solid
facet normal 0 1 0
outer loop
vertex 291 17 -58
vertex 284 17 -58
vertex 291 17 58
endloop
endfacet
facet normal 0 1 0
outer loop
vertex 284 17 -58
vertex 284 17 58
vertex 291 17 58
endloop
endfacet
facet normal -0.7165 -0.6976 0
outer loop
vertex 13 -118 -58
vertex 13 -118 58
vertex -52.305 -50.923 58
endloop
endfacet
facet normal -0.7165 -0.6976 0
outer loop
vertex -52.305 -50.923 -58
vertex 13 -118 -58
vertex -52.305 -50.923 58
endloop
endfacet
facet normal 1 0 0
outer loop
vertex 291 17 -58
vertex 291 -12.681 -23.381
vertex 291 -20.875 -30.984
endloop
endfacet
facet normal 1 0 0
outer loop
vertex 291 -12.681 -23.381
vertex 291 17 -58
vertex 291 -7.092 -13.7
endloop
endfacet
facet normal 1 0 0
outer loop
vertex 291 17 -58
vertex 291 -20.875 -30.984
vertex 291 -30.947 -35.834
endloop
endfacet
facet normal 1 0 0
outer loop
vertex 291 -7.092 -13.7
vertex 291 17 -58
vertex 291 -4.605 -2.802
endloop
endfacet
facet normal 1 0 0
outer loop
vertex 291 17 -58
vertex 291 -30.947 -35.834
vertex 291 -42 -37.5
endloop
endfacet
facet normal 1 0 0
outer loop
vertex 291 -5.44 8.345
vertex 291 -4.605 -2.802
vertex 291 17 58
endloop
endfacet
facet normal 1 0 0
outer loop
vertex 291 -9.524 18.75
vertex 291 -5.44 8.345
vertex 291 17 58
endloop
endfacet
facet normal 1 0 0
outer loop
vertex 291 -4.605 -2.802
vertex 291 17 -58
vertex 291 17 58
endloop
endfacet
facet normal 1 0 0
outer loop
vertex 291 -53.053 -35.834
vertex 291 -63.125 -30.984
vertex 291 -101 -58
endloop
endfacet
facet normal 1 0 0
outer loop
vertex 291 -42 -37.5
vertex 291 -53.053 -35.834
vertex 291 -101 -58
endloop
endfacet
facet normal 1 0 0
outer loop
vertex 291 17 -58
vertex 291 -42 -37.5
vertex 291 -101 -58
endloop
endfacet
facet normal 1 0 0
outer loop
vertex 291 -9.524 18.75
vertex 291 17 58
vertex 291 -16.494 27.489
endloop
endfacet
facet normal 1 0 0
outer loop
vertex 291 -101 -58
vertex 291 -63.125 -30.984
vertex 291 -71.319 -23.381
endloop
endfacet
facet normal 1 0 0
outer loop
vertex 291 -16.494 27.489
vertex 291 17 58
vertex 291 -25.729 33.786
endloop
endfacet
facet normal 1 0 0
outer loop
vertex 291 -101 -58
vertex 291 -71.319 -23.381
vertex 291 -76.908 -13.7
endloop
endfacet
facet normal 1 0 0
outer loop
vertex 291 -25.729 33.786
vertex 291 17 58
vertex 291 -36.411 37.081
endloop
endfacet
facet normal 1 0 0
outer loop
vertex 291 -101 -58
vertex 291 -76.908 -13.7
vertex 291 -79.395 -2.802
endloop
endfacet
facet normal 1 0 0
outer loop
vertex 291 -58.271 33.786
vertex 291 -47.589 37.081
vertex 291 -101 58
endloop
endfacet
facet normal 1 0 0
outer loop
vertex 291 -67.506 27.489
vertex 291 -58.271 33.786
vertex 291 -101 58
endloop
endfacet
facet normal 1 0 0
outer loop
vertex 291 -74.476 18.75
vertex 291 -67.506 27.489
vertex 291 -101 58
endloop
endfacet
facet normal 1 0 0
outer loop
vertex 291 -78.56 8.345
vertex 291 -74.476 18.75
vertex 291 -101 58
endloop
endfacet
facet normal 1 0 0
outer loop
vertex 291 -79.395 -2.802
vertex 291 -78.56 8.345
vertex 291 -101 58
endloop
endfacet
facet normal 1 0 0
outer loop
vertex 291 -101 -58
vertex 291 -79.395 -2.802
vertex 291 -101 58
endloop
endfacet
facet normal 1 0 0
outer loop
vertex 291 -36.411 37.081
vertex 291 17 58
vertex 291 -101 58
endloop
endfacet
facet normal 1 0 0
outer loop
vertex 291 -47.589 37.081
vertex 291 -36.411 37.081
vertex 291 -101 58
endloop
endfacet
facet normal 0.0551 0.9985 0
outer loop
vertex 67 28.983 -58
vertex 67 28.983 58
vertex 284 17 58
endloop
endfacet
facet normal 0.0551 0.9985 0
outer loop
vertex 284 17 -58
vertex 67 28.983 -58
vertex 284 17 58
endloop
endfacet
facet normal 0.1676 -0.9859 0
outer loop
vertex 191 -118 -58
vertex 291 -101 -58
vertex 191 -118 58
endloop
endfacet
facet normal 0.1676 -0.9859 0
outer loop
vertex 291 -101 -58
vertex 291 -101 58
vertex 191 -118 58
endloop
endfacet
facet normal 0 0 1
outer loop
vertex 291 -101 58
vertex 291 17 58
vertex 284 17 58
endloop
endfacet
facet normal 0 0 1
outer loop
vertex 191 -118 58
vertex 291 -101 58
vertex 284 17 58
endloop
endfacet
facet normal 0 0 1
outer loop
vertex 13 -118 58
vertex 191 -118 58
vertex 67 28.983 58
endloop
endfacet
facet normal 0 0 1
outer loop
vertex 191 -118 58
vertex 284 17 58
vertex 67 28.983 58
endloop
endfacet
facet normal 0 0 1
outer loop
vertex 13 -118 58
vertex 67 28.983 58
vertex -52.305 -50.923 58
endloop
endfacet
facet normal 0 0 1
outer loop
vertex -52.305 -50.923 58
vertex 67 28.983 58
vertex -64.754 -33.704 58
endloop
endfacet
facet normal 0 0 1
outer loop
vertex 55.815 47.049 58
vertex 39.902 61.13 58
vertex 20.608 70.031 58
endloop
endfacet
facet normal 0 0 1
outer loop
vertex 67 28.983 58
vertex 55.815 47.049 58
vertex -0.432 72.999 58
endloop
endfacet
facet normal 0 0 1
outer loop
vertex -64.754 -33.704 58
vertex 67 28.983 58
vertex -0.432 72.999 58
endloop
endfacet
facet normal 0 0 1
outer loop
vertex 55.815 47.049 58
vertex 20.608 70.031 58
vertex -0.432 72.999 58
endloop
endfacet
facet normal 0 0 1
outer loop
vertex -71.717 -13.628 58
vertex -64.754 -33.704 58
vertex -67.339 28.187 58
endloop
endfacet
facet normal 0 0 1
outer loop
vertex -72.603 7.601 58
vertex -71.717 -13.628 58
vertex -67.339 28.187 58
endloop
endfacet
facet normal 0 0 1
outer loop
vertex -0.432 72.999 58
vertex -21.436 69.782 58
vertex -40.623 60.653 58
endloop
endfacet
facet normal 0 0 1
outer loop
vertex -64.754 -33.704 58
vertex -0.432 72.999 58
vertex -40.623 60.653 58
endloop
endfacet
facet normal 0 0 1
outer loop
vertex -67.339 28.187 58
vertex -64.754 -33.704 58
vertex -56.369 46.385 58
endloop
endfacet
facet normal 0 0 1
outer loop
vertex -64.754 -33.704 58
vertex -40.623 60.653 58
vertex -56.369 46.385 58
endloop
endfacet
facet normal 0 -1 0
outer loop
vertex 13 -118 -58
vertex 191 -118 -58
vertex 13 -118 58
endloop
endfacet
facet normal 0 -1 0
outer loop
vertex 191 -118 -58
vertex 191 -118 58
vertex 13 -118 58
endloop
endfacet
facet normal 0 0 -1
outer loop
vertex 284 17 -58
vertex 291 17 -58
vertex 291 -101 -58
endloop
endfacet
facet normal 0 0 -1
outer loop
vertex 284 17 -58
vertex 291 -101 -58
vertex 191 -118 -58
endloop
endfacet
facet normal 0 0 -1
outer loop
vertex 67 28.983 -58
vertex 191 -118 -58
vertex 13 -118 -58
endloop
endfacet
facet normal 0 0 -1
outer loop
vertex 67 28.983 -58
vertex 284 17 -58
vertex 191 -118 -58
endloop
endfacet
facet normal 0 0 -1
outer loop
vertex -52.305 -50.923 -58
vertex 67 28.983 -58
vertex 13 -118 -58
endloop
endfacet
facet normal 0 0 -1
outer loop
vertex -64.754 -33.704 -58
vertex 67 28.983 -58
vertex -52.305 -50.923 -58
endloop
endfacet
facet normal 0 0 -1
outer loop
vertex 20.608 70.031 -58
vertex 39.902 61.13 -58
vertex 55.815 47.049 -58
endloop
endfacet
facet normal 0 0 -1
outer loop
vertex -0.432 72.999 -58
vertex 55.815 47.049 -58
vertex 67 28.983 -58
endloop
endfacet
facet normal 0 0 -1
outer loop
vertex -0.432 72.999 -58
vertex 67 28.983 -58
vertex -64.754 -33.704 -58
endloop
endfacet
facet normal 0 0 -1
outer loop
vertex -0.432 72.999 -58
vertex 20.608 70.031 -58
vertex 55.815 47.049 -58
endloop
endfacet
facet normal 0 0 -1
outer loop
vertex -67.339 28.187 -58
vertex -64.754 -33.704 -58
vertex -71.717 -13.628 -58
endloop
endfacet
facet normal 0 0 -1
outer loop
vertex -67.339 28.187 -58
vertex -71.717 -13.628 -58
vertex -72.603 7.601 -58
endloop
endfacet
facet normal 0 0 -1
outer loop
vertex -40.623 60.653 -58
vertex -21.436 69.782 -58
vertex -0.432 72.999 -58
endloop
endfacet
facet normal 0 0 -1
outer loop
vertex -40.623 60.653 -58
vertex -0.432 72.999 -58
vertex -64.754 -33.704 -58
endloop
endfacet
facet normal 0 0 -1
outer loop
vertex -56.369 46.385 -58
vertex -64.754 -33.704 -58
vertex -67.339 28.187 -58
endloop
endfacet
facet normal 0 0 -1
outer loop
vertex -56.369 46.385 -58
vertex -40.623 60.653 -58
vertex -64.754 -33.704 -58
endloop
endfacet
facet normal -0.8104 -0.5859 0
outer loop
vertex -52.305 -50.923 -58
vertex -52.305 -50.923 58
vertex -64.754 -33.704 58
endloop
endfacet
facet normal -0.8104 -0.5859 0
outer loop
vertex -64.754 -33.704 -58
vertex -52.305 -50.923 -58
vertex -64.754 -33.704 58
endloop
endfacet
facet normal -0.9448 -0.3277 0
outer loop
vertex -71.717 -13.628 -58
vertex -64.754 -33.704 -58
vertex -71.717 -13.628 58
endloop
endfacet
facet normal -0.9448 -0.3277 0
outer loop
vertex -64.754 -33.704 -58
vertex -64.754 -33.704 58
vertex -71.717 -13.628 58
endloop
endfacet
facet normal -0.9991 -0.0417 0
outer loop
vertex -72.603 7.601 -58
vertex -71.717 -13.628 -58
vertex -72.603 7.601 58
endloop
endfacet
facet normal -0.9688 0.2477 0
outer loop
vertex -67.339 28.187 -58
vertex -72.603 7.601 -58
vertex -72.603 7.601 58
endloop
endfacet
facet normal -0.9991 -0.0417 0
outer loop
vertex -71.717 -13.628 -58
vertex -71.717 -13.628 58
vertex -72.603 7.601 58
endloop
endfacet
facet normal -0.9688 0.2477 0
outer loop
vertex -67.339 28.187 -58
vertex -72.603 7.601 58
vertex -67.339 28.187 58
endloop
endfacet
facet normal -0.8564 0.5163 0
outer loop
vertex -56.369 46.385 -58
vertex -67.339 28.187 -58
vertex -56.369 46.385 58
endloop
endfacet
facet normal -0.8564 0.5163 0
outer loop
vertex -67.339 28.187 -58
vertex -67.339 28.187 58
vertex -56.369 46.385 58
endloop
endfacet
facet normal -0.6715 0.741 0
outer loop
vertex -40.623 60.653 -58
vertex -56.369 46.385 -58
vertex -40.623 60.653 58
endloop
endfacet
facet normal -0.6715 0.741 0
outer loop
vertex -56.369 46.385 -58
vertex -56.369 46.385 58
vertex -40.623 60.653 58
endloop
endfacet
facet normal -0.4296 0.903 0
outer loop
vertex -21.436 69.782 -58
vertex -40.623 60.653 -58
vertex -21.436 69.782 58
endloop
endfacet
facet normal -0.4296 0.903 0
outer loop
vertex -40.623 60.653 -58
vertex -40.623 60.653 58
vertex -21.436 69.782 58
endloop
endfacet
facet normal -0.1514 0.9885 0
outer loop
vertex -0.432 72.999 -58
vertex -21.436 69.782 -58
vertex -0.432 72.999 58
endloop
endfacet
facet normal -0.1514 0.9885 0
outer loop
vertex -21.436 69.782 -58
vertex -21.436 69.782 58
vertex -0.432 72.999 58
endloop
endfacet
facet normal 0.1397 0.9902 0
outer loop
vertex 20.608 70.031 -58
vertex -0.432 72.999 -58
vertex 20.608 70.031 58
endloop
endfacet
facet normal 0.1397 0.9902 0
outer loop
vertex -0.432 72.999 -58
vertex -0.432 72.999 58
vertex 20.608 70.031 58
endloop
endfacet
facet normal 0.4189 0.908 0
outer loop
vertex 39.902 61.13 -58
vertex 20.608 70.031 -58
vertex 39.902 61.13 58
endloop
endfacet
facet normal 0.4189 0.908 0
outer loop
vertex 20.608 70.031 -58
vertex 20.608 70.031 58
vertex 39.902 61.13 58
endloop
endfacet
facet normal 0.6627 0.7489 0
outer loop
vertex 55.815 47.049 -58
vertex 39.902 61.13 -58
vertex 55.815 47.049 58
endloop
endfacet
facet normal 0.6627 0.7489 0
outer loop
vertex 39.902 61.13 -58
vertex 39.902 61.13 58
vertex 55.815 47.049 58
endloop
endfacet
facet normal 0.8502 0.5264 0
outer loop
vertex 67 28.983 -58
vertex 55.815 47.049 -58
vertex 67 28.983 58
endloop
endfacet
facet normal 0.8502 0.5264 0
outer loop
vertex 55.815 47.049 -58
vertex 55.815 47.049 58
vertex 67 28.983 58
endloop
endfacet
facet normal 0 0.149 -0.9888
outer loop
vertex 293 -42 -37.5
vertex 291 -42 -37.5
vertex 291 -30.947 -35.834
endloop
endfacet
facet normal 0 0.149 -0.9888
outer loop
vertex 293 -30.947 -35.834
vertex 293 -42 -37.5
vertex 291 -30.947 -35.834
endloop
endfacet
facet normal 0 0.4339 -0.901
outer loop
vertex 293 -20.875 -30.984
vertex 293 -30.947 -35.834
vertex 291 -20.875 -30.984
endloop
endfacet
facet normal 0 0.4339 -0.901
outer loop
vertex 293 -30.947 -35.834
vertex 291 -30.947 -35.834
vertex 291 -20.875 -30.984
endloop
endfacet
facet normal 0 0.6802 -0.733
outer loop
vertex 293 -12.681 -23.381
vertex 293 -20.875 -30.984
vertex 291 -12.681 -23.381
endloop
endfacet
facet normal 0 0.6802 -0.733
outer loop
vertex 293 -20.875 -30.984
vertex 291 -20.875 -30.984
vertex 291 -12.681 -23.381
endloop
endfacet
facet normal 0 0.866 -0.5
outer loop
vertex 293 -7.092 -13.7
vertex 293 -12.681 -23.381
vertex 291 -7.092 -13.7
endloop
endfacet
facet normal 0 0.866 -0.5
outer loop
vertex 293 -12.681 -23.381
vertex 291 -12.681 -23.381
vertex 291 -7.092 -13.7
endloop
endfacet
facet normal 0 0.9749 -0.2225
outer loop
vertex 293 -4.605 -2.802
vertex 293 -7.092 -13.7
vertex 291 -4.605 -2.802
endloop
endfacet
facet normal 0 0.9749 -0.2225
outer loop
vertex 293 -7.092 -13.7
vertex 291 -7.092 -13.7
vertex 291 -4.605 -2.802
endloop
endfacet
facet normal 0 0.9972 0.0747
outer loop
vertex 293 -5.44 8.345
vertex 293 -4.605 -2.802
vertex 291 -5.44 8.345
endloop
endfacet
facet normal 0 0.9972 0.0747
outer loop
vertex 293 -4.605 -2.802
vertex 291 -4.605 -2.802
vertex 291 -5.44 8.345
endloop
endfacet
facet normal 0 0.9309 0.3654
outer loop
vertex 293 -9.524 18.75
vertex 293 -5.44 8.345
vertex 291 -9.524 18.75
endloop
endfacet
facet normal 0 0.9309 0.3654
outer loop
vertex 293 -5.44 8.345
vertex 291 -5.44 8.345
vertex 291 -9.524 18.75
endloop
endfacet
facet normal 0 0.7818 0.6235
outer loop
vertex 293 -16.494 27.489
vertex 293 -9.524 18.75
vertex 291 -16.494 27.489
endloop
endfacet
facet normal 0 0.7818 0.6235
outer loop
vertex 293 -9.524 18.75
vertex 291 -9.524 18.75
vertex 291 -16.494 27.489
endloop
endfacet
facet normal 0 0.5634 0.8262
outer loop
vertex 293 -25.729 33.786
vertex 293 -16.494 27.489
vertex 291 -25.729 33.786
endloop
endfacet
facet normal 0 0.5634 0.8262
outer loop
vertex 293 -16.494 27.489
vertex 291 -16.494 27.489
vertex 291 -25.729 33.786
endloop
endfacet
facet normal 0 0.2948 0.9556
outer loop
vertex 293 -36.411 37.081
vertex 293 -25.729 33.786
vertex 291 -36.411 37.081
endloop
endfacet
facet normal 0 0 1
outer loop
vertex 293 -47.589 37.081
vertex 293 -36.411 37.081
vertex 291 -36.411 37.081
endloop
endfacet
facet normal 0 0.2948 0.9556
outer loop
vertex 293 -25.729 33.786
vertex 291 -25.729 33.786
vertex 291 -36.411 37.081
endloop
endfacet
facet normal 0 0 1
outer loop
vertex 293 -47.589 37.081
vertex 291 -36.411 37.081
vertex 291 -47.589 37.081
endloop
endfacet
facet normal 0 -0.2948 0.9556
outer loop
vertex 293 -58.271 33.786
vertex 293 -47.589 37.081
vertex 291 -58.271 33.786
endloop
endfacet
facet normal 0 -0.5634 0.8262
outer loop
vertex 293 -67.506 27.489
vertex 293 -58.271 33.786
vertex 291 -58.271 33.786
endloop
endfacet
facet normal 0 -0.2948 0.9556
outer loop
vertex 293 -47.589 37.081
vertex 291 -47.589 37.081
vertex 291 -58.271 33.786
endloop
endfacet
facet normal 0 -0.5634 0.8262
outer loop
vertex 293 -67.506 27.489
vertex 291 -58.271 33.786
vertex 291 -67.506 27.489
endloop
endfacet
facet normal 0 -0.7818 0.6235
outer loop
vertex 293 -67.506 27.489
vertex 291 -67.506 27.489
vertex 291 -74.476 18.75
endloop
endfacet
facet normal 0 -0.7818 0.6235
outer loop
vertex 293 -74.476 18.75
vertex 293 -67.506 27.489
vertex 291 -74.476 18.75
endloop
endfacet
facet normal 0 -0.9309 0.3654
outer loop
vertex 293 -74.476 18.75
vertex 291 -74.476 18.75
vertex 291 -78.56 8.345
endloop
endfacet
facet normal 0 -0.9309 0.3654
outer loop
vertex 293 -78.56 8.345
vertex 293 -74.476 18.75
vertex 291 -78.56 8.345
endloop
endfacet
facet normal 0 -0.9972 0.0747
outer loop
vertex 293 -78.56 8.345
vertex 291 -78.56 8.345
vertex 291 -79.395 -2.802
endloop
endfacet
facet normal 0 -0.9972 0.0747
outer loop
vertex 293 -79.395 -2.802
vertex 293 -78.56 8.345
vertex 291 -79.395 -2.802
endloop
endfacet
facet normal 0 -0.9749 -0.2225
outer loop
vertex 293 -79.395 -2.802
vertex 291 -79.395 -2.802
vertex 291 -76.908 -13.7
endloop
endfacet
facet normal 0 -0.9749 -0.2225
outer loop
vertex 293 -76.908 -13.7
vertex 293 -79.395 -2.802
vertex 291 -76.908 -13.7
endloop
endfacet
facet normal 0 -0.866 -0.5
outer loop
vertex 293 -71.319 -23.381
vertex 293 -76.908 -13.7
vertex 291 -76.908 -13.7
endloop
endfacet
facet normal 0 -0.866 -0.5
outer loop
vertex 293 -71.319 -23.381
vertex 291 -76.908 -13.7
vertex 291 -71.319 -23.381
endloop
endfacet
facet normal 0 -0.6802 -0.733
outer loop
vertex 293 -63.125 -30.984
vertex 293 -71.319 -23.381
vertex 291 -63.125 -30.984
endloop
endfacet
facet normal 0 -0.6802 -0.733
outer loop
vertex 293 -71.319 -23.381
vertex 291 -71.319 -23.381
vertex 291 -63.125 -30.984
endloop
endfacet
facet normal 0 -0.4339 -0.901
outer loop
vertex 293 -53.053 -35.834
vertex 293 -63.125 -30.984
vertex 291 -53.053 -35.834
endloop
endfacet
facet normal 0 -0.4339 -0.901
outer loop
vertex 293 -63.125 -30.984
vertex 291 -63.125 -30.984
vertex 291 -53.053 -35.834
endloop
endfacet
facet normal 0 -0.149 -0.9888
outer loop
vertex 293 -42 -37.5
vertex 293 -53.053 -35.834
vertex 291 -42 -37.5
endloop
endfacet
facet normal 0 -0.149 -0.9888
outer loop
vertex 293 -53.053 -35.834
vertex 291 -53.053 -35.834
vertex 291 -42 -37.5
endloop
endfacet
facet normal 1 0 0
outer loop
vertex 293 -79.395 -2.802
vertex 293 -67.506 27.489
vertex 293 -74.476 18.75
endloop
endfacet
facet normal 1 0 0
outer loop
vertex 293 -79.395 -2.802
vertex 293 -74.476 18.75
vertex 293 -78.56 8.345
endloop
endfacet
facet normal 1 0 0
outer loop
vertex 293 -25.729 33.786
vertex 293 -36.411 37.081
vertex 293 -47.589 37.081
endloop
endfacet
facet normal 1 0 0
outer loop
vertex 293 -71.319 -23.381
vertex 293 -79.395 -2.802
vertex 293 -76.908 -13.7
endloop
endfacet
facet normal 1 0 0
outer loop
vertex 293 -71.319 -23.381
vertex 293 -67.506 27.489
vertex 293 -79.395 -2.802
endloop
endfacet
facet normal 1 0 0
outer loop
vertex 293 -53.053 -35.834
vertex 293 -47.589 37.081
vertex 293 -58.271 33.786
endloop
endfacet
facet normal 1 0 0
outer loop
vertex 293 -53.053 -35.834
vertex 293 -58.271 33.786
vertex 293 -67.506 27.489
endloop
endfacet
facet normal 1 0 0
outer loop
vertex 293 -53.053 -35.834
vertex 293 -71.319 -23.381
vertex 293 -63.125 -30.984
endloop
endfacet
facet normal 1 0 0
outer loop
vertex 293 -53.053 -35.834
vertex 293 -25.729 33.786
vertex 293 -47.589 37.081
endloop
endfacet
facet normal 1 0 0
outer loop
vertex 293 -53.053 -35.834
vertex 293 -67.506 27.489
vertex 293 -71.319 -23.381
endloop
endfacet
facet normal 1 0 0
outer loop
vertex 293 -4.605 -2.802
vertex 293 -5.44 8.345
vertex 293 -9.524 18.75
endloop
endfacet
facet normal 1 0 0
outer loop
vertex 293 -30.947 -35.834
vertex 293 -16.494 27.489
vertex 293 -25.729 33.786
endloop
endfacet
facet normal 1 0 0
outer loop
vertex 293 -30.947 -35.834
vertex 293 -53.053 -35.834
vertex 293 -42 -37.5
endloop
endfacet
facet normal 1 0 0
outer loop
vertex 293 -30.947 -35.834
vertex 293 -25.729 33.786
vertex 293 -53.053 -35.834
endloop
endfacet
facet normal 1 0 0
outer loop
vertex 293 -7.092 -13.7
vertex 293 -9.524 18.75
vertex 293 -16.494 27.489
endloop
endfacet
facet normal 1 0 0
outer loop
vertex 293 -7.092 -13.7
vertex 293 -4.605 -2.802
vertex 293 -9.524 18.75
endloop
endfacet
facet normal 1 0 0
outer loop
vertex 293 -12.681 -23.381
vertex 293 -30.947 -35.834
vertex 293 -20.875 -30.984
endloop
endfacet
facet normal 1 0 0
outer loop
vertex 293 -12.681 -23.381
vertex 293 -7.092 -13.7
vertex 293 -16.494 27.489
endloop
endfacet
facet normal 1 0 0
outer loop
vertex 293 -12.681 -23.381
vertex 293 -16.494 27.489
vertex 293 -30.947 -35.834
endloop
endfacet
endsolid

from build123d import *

# Parameters (mm, degrees)
BOSS_EXTRUDE1_DEPTH = 58
SKETCH2_R           = 37.5
BOSS_EXTRUDE2_DEPTH = 2


with BuildPart() as part:
    # Sketch1 → Boss-Extrude1 (new, symmetric)
    with BuildSketch(Plane.XY):
        with BuildLine():
            Line((67, 28.982753492), (284, 17))
            Line((284, 17), (291, 17))
            Line((291, 17), (291, -101))
            Line((291, -101), (191, -118))
            Line((191, -118), (13, -118))
            Line((13, -118), (-52.304922539, -50.92342367))
            ThreePointArc((-52.304922539, -50.92342367), (-40.62309211, 60.652818462), (67, 28.982753492))
        make_face()
    extrude(amount=BOSS_EXTRUDE1_DEPTH, both=True)

    # Sketch2 → Boss-Extrude2 (add)
    with BuildSketch(Plane(origin=(291, 0, 0), x_dir=(0, 0, -1), z_dir=(1, 0, 0))):
        with Locations((0, -42)):
            Circle(SKETCH2_R)
    extrude(amount=BOSS_EXTRUDE2_DEPTH)


solid = part.part
